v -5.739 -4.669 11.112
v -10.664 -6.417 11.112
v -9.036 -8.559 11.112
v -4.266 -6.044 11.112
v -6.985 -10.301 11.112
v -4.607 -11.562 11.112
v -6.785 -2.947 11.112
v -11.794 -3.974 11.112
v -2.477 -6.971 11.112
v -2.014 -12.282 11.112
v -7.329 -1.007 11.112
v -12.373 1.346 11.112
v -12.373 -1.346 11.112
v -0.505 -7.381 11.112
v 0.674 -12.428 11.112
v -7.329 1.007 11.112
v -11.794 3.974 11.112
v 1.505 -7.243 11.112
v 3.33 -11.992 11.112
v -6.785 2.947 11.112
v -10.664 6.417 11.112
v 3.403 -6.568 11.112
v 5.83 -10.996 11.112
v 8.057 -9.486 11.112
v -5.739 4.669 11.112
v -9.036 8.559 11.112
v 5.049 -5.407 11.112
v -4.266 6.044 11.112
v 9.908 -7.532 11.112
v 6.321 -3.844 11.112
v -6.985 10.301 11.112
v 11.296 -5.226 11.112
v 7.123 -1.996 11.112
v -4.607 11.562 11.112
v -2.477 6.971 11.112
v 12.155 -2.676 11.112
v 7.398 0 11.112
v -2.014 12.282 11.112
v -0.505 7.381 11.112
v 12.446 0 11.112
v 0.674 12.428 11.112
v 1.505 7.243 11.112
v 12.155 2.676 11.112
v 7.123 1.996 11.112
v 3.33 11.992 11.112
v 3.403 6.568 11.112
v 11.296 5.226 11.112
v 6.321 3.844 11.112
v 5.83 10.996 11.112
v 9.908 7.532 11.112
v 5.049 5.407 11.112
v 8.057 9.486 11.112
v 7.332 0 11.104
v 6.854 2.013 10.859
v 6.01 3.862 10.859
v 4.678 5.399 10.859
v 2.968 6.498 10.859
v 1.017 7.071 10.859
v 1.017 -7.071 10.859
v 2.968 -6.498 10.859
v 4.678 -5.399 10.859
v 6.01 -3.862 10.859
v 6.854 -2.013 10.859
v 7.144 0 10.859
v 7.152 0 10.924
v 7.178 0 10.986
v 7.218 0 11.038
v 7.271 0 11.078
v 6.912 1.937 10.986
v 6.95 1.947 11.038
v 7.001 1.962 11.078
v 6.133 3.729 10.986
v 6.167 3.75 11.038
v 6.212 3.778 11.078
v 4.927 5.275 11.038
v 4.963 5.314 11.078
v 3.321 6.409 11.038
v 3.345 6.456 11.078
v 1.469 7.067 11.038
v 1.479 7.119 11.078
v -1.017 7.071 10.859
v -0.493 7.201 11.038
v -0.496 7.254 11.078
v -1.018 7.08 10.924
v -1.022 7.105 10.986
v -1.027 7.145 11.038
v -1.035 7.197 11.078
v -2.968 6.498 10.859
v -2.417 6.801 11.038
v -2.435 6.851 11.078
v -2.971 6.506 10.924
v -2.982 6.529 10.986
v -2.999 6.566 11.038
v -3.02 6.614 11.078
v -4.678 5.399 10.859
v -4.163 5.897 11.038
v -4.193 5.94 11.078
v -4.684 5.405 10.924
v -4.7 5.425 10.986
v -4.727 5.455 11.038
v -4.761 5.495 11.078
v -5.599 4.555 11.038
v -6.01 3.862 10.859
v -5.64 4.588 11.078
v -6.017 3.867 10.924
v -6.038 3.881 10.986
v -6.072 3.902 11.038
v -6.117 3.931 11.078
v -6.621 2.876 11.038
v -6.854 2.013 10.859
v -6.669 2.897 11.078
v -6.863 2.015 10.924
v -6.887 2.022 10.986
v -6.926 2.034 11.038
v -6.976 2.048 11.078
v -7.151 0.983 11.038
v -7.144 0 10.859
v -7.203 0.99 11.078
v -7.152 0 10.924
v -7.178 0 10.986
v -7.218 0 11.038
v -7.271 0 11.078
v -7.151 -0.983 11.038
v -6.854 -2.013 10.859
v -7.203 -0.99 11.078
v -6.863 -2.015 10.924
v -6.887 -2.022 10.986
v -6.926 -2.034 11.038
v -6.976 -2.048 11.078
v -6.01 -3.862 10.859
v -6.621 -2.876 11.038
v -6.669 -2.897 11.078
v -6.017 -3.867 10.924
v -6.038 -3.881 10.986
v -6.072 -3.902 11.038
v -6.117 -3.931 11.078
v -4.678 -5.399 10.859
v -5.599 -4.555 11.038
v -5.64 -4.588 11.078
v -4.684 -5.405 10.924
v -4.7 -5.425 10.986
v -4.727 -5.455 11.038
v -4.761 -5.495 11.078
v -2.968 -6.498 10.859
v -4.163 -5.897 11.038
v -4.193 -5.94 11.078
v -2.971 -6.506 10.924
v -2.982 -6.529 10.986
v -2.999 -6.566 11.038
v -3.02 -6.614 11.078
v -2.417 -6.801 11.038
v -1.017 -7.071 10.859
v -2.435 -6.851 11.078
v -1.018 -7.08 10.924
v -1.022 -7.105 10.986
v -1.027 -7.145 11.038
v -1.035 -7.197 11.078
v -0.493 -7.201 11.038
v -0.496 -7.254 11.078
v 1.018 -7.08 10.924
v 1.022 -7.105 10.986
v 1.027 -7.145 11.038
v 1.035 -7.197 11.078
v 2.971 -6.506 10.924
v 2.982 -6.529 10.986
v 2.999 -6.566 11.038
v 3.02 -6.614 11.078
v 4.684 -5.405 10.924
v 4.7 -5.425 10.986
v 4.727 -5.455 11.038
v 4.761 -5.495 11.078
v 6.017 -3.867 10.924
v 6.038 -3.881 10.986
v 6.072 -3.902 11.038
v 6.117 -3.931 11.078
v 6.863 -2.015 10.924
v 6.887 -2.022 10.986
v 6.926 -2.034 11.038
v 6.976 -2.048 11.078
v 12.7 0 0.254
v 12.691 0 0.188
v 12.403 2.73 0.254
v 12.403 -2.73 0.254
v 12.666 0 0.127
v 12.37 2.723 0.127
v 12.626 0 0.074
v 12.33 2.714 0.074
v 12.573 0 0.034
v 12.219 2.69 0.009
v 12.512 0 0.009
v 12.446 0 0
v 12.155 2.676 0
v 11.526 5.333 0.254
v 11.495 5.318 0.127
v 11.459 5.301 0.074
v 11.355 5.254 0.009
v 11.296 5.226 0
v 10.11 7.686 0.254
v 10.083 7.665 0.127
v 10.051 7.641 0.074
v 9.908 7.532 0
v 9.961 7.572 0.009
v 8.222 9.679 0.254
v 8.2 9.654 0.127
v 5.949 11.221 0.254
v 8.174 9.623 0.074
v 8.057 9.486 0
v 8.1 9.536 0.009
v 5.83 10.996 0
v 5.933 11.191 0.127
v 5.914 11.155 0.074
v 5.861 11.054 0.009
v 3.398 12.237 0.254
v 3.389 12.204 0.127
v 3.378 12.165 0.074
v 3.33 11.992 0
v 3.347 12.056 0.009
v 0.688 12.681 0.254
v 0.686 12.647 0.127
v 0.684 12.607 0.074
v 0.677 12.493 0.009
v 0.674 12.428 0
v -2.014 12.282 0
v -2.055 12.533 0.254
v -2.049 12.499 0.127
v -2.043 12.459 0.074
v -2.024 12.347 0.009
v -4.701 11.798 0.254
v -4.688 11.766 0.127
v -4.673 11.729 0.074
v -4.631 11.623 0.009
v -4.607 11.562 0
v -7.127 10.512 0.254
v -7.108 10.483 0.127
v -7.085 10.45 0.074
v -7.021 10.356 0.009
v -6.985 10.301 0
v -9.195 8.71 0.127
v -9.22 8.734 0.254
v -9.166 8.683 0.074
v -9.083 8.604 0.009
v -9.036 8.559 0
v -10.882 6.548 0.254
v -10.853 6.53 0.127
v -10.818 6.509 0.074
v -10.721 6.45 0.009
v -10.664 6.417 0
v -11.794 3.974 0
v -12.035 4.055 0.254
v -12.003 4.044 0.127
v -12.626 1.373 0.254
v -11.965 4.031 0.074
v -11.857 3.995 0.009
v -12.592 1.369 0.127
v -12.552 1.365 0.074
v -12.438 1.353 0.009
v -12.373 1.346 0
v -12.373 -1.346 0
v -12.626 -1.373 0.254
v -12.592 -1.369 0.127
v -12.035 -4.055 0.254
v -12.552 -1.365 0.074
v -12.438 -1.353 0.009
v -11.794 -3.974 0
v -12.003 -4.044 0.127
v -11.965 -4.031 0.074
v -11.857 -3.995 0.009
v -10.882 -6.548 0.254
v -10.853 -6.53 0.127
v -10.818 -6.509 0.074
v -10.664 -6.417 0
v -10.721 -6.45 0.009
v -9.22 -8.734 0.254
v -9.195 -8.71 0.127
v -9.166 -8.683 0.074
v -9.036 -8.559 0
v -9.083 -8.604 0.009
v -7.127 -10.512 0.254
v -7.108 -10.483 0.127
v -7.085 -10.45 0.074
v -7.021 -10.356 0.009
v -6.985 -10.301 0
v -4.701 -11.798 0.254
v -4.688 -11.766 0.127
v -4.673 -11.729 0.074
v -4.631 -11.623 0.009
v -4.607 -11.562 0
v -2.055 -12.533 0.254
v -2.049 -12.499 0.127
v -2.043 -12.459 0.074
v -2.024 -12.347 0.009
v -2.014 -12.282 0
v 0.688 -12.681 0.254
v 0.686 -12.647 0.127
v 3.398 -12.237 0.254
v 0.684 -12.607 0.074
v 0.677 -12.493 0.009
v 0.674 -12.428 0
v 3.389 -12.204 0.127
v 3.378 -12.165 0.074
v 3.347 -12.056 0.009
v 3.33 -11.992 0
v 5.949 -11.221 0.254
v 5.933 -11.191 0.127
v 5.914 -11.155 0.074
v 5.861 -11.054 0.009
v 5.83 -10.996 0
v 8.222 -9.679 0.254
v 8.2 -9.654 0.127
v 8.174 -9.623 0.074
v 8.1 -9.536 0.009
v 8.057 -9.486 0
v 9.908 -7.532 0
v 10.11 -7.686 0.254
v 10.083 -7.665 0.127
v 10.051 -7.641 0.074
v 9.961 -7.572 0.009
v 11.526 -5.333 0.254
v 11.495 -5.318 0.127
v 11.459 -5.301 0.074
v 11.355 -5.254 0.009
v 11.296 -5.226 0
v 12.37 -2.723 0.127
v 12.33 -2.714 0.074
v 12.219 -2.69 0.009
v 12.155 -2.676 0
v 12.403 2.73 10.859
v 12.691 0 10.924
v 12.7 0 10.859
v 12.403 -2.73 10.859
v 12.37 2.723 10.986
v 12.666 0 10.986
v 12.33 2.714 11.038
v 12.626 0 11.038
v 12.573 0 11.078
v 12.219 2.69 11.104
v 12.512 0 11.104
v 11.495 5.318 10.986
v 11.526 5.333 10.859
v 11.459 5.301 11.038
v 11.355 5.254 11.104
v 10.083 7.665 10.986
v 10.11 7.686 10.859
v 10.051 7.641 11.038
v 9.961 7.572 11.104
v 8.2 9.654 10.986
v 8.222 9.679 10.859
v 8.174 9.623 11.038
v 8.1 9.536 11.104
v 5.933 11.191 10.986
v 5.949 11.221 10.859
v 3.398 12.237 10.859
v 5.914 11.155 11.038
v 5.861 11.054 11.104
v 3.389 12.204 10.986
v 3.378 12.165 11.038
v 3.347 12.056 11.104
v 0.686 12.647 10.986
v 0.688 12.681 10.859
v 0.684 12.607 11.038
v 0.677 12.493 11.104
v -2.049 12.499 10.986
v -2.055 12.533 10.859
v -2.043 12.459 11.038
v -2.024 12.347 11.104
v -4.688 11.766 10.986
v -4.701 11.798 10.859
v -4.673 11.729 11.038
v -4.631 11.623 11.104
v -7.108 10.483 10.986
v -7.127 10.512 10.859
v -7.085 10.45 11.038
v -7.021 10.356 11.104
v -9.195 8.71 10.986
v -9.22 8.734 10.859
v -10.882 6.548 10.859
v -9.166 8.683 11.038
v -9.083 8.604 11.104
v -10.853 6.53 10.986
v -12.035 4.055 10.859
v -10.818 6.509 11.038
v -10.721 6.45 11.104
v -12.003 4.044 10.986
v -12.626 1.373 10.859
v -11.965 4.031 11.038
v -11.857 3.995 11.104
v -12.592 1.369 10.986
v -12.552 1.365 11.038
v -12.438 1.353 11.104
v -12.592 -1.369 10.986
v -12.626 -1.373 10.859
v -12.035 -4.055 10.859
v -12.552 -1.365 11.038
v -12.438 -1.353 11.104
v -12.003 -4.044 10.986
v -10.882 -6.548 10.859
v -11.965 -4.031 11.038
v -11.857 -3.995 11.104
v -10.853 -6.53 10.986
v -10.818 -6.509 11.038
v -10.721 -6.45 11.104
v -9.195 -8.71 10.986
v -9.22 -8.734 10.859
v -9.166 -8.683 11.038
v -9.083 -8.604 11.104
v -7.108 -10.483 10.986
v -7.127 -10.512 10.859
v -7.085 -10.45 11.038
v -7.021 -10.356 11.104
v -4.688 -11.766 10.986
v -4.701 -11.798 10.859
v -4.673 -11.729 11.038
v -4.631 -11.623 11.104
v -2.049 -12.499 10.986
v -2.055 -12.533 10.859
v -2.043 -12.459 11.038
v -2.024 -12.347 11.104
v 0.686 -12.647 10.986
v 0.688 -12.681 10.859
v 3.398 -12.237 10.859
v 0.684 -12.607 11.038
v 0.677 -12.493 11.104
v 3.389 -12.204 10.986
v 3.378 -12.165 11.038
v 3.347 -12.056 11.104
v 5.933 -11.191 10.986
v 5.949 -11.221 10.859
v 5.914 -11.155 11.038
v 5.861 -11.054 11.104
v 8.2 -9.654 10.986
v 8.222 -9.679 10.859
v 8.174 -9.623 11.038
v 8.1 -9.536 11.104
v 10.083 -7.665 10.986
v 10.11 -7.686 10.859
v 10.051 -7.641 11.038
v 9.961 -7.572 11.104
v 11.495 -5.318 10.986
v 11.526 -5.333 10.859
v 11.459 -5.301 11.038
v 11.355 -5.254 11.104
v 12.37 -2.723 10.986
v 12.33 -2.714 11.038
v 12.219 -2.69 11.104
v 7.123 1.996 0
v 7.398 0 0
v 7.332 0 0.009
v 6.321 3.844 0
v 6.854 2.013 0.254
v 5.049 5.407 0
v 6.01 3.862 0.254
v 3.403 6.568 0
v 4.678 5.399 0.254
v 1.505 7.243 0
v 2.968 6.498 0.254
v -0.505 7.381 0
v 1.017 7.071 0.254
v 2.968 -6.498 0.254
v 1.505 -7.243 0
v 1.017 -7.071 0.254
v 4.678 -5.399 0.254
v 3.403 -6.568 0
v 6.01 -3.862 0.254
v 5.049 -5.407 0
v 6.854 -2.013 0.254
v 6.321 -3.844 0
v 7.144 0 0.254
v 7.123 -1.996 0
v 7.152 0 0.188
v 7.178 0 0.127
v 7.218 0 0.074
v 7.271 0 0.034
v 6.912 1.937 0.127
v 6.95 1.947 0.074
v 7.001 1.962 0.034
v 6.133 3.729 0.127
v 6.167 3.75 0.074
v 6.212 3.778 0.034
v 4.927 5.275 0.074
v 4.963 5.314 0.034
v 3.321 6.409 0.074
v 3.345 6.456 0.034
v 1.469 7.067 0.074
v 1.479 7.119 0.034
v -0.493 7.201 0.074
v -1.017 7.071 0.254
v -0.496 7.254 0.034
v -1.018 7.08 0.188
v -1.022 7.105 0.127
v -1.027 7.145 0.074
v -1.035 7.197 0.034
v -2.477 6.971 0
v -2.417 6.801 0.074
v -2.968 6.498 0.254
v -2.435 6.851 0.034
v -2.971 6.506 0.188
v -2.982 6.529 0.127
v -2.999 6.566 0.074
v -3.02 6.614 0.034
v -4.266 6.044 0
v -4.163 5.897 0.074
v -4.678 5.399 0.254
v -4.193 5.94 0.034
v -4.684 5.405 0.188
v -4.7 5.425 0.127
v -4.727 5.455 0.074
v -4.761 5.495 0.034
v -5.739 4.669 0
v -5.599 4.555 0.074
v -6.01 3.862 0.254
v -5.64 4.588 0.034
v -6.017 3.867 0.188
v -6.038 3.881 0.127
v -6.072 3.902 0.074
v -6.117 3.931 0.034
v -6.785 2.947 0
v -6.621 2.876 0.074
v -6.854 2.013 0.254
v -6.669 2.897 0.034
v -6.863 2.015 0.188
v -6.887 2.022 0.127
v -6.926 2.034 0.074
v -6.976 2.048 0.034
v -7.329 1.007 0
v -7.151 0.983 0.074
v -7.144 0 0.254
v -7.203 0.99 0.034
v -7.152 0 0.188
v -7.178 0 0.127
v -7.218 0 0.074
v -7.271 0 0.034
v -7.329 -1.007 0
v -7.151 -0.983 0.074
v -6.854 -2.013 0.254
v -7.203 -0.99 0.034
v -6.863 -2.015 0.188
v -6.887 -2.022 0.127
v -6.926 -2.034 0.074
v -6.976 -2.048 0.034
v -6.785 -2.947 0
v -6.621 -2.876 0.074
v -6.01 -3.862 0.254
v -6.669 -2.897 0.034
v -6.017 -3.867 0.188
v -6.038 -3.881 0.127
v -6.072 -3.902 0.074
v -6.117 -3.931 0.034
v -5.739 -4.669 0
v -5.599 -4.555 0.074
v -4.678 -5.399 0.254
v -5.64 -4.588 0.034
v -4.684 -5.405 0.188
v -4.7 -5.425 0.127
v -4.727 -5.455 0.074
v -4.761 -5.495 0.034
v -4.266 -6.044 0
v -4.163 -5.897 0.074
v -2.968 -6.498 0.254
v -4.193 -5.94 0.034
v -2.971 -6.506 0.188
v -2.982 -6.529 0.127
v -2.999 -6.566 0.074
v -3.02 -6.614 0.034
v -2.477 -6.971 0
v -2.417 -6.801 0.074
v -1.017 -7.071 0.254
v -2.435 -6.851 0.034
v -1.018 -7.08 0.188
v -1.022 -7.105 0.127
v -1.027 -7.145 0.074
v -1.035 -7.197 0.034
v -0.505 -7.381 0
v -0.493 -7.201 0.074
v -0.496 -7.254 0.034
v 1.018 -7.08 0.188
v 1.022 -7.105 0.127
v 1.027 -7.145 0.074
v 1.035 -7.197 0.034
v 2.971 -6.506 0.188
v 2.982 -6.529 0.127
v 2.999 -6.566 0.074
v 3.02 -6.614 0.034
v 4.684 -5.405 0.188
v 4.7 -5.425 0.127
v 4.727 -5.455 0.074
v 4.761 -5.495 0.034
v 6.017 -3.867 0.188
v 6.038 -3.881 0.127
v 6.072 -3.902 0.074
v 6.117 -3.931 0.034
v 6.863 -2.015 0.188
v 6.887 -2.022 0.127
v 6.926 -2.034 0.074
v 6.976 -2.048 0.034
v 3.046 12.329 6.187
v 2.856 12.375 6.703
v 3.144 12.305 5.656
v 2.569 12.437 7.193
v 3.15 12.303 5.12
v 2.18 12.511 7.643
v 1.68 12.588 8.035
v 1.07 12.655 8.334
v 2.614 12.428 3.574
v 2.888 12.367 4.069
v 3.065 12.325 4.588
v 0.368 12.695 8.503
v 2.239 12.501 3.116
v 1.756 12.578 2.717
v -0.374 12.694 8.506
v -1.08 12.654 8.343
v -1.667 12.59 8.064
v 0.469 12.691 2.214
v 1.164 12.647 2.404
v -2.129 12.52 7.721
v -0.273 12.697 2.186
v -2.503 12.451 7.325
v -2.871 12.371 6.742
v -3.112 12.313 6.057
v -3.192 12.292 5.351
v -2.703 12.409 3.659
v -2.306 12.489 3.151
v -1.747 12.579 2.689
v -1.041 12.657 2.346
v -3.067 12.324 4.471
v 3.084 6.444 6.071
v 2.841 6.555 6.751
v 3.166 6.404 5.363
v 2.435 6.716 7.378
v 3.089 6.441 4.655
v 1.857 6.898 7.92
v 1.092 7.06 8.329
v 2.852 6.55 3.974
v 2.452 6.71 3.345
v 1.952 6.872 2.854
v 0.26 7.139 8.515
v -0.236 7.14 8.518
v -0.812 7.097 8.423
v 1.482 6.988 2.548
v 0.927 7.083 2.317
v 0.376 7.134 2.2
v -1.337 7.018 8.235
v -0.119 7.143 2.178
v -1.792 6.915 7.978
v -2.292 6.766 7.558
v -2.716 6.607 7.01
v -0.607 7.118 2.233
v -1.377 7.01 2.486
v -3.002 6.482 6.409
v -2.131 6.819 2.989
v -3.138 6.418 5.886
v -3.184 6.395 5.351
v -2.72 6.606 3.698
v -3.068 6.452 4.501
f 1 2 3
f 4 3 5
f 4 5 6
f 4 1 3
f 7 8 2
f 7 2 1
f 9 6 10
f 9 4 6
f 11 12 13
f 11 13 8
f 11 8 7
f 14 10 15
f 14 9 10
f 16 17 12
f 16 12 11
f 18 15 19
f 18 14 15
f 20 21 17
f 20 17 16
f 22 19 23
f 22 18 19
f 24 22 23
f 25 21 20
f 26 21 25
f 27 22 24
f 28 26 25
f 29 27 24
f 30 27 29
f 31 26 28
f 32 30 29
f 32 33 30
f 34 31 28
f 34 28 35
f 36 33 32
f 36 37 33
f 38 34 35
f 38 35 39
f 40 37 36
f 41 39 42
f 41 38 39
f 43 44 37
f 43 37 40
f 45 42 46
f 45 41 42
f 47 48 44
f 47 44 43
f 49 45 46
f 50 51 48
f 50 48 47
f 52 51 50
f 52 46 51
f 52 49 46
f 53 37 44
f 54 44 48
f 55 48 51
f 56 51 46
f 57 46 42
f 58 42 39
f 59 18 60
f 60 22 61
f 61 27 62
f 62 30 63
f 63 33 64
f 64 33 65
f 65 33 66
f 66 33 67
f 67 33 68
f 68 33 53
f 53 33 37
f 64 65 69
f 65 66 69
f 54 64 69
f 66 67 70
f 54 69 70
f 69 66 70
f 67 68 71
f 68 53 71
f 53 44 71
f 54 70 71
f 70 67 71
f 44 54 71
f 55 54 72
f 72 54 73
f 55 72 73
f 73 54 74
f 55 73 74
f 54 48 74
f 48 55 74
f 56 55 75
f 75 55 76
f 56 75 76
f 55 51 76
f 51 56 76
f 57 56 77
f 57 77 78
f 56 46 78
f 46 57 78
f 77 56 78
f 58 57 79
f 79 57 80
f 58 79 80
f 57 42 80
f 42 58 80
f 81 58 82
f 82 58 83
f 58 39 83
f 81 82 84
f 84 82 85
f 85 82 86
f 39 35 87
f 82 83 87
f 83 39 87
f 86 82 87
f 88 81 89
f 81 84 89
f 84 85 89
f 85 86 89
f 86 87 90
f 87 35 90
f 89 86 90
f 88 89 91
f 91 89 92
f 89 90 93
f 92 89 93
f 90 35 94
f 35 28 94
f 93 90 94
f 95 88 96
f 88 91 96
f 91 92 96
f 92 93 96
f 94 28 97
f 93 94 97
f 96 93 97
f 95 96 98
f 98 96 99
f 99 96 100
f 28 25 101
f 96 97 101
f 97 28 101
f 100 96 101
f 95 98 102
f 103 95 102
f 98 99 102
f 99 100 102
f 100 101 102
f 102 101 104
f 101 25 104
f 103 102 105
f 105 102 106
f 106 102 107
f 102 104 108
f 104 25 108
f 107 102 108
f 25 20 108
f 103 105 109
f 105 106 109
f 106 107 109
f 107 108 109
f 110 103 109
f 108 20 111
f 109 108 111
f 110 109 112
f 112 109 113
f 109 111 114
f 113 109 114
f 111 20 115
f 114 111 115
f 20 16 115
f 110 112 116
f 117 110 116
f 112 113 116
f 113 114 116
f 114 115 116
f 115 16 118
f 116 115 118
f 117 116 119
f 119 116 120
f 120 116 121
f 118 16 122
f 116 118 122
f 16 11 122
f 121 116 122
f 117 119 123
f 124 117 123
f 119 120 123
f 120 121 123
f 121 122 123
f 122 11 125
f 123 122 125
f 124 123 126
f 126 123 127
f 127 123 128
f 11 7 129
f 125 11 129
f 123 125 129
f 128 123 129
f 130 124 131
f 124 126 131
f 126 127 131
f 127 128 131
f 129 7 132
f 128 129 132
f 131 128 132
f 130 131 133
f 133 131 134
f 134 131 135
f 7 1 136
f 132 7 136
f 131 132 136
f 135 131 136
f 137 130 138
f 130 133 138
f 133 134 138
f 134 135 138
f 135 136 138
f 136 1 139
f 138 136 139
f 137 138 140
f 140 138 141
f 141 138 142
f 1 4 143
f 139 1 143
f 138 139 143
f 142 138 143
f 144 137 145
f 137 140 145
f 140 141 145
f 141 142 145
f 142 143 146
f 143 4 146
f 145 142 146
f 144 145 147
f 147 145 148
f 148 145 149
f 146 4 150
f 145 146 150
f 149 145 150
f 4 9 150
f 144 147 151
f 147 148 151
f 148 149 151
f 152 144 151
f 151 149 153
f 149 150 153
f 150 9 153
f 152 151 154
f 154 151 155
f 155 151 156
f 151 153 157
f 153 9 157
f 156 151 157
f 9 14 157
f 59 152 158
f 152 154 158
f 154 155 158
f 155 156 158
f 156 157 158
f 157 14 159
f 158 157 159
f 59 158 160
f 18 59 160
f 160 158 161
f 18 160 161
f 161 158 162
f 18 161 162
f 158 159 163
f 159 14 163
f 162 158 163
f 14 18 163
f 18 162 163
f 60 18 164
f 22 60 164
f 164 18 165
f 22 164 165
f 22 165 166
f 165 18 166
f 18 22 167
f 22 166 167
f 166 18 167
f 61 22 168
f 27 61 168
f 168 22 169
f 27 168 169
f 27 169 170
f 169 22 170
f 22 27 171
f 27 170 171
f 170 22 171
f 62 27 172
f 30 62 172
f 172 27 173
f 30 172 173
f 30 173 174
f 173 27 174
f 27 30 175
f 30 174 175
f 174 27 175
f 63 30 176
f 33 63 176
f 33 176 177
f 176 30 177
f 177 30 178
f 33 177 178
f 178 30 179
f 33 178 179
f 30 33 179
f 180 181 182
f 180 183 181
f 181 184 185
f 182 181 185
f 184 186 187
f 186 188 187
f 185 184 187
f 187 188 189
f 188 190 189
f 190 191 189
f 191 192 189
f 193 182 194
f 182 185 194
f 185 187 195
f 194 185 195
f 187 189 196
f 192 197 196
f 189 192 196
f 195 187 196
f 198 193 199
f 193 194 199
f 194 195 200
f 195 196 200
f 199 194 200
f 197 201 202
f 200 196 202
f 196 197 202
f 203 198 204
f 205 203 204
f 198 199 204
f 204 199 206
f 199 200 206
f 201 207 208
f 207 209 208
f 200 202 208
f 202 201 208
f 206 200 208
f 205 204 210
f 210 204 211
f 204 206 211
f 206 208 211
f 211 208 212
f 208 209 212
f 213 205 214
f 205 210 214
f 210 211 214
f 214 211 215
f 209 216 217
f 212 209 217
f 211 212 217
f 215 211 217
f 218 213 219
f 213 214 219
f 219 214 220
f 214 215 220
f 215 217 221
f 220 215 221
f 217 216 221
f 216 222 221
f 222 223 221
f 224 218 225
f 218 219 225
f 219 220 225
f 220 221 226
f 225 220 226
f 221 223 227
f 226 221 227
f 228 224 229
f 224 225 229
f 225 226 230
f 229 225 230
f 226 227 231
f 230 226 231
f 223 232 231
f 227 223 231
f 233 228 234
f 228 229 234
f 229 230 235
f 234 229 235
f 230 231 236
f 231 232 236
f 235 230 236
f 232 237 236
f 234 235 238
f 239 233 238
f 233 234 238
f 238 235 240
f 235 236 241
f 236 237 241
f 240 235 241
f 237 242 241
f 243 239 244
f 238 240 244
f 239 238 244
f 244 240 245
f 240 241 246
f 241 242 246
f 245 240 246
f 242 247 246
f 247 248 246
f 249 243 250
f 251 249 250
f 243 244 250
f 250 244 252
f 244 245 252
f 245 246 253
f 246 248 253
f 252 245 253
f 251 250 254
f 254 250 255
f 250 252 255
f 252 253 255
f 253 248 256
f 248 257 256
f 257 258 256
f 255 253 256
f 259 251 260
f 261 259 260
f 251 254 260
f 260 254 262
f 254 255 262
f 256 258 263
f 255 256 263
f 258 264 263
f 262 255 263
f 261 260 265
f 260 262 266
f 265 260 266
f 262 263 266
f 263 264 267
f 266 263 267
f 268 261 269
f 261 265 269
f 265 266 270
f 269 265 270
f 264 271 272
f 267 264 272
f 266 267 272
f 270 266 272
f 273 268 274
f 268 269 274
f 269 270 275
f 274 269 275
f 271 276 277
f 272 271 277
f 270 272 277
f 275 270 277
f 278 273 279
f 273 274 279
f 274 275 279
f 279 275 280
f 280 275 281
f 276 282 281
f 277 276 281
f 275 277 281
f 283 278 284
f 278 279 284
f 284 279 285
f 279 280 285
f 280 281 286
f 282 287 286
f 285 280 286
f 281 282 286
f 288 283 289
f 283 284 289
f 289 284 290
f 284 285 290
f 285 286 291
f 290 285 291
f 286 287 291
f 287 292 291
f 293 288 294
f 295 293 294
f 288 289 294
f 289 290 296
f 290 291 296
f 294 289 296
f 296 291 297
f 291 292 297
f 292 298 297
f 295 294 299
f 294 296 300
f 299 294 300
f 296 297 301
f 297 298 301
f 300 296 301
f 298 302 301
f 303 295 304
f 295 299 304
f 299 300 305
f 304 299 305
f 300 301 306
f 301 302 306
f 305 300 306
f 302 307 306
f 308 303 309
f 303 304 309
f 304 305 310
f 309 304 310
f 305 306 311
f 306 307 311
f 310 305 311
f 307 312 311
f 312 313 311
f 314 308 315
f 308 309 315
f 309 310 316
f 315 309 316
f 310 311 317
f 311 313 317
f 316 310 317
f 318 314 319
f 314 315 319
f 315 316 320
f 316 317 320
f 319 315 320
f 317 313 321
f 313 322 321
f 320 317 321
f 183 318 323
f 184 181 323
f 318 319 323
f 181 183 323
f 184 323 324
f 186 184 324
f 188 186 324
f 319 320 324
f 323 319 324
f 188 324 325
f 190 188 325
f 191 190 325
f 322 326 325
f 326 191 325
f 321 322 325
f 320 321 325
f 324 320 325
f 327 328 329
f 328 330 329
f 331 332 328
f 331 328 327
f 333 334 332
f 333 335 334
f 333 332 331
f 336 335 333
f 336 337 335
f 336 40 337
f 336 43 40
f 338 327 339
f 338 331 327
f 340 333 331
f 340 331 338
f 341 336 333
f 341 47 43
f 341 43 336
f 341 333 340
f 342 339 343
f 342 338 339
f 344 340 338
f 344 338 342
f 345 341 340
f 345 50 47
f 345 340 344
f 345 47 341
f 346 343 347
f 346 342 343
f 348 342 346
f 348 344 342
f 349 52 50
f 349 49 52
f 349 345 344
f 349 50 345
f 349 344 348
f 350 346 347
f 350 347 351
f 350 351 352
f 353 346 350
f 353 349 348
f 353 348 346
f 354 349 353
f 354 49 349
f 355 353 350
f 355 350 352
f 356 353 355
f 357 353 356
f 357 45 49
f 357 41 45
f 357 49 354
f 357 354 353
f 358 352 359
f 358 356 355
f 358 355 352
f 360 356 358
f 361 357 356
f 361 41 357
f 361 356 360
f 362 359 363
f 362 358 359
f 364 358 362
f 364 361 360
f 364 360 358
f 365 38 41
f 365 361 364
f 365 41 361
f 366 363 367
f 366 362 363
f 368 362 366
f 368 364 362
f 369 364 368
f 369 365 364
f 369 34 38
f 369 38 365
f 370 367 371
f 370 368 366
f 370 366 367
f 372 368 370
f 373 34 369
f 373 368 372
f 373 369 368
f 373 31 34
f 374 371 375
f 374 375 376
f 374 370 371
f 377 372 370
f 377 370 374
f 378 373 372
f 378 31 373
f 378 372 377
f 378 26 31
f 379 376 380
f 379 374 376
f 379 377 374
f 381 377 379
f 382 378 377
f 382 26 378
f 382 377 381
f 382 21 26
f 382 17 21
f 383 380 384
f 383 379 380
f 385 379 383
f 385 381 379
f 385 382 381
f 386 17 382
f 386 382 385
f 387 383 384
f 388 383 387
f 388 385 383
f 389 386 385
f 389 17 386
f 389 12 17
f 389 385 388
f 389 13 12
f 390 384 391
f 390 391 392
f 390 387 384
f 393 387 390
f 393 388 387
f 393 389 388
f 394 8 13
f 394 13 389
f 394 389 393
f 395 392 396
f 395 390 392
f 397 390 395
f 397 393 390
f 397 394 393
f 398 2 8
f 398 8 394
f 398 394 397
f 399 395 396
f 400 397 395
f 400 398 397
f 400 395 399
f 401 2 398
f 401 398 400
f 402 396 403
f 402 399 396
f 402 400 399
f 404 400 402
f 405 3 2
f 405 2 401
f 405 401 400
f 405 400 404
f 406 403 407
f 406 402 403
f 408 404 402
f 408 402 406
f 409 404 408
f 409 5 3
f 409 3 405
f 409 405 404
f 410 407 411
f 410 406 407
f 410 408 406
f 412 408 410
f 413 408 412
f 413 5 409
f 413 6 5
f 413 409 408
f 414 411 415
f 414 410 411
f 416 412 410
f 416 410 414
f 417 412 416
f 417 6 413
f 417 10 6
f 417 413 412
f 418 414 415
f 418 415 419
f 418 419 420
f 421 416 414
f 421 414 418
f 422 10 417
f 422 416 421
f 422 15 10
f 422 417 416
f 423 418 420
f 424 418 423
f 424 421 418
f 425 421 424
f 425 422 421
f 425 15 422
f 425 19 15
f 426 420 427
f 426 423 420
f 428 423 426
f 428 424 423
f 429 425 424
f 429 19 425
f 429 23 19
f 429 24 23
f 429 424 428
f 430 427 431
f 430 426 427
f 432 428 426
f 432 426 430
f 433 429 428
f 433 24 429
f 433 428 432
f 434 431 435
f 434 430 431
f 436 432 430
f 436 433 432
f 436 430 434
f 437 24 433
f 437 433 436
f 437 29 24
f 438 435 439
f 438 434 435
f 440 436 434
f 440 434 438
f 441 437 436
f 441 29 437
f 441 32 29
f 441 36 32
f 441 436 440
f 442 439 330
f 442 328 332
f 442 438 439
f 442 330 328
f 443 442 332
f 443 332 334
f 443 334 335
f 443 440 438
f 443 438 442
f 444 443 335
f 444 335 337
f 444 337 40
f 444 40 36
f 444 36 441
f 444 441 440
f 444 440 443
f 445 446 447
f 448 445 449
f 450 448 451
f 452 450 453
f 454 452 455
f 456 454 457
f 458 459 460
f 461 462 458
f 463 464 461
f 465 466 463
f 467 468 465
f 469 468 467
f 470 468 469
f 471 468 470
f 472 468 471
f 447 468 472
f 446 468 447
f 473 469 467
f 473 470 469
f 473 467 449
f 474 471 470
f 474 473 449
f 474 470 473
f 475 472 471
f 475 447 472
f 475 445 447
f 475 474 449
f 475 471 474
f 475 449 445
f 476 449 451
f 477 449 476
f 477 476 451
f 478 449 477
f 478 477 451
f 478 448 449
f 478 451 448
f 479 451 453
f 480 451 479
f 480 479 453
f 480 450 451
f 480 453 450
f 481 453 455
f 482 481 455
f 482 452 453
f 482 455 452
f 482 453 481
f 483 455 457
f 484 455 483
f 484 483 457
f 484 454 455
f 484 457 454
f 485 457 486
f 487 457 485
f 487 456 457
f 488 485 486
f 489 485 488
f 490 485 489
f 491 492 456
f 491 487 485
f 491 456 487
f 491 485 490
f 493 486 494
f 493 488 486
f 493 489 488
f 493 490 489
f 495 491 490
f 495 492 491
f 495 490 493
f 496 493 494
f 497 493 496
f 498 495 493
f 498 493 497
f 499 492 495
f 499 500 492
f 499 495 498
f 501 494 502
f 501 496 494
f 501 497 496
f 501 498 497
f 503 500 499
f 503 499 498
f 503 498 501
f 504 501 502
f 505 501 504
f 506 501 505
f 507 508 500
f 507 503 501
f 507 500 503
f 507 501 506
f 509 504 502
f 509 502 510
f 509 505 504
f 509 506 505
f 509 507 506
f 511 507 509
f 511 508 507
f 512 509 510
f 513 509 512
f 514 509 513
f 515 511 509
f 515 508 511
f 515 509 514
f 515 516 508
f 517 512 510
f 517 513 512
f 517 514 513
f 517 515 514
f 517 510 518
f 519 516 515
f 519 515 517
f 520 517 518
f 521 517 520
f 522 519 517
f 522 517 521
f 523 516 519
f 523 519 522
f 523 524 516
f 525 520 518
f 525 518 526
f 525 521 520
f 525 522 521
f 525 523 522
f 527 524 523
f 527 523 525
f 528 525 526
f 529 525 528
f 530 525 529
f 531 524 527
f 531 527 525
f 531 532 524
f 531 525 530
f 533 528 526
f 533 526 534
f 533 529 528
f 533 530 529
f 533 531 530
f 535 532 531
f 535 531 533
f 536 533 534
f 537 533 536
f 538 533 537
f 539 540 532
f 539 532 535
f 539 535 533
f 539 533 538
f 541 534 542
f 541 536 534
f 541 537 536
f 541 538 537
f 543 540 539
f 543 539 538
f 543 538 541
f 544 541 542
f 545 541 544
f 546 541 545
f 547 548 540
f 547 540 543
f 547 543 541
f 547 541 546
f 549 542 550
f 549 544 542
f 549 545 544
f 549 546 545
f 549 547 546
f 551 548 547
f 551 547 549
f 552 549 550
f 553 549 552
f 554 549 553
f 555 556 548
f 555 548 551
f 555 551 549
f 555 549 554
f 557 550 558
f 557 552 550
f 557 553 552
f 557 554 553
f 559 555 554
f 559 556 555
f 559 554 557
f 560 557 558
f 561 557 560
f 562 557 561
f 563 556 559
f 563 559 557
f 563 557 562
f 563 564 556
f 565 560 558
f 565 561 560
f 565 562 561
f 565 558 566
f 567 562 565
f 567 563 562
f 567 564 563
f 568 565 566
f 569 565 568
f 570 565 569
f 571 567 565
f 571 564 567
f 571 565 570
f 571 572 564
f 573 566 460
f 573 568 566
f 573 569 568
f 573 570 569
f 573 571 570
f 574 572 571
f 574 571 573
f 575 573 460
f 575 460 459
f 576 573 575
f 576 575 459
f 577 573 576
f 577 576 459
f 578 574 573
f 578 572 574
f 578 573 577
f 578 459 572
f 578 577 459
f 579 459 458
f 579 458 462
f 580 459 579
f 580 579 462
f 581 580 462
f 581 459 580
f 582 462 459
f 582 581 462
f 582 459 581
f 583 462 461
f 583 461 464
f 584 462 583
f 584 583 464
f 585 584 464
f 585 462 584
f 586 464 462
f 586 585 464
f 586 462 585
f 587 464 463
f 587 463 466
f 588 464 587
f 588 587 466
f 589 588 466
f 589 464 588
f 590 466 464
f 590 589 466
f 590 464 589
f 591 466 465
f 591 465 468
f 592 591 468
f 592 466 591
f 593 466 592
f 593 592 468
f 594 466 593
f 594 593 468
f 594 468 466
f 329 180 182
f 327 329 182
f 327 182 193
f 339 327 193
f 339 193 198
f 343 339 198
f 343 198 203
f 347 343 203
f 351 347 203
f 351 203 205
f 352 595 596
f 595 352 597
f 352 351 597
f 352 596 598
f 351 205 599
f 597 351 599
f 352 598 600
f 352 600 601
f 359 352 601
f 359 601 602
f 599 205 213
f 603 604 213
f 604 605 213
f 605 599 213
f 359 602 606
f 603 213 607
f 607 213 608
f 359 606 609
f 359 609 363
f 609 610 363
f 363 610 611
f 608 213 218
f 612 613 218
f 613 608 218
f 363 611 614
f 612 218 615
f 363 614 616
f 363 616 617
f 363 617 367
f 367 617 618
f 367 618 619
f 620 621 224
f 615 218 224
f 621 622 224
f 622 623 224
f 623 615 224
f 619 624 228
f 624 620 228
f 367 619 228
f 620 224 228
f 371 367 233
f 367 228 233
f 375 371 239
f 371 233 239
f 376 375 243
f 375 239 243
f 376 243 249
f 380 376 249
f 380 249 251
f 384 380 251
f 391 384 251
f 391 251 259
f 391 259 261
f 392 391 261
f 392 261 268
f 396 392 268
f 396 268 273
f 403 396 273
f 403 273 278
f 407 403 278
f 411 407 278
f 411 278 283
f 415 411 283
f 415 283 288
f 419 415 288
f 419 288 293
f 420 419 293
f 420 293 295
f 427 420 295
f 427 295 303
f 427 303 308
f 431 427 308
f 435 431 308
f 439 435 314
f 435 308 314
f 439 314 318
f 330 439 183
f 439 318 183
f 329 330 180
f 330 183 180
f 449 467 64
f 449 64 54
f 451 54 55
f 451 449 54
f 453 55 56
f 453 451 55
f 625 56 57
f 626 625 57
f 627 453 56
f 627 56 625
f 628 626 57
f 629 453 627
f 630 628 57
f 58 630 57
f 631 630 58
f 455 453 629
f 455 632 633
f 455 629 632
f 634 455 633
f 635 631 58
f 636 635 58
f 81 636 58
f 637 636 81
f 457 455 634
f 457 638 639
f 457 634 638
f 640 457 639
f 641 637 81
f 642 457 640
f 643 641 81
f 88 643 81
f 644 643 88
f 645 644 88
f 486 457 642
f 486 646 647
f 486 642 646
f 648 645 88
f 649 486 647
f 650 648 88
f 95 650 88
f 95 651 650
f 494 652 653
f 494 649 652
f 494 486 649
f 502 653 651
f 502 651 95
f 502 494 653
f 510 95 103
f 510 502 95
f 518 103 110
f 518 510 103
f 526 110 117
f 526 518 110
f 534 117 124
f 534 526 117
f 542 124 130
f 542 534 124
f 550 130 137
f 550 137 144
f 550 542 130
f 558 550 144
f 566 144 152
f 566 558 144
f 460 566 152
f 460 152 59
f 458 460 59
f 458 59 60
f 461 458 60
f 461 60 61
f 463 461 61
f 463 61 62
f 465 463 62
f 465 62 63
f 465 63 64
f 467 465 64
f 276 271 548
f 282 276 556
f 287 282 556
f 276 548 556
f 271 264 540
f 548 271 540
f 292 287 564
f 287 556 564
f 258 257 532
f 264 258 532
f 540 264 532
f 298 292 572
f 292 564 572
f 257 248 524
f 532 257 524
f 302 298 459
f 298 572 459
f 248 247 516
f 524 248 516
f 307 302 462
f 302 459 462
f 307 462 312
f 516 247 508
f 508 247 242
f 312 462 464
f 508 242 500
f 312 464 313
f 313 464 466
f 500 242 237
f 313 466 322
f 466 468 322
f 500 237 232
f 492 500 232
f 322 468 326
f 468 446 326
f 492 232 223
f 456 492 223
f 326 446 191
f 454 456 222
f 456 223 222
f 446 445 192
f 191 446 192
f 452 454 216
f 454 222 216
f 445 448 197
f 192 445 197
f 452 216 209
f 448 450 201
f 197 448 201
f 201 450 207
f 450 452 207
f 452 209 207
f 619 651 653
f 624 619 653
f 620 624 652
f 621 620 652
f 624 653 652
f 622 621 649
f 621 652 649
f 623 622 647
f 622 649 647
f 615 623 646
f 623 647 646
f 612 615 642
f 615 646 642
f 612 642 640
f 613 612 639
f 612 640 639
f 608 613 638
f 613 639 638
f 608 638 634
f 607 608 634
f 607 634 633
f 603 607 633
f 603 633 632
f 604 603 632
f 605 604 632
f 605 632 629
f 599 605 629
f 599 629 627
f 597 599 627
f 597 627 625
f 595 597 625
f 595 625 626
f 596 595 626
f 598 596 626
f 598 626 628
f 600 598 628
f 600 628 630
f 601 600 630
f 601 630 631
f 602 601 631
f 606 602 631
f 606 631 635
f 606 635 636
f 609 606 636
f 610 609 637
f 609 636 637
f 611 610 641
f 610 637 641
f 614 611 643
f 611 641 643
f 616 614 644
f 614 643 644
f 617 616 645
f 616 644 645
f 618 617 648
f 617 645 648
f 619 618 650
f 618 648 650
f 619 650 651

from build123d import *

# Parameters (mm, degrees)
SKETCH1_R                       = 12.7
SKETCH1_R_2                     = 7.14375
BOSS_EXTRUDE1_DEPTH             = 11.1125
FILLET1_R                       = 0.254
F_1_4_0_25_DIAMETER_HOLE1_D     = 6.35
F_1_4_0_25_DIAMETER_HOLE1_DEPTH = 10.922
F_1_4_0_25_DIAMETER_HOLE1_TIP   = 1.907732465


with BuildPart() as part:
    # Sketch1 → Boss-Extrude1 (new body)
    with BuildSketch(Plane.XY):
        Circle(SKETCH1_R)
        Circle(SKETCH1_R_2, mode=Mode.SUBTRACT)
    extrude(amount=BOSS_EXTRUDE1_DEPTH)

    # Fillet1
    fillet1_edges = [part.edges().sort_by_distance(p)[0] for p in [
        (-12.7, 0, 0),
        (-12.7, 0, 11.1125),
        (-7.14375, 0, 0),
        (-7.14375, 0, 11.1125),
    ]]
    fillet(fillet1_edges, radius=FILLET1_R)

    # 1/4 (0.25) Diameter Hole1
    with Locations(Plane(origin=(-0.017095138, 12.699988494, 5.351108343), x_dir=(0.999999094, 0.001346074, 0), z_dir=(-0.001346074, 0.999999094, 0))):
        with Locations((0, 0)):
            Hole(F_1_4_0_25_DIAMETER_HOLE1_D / 2, depth=F_1_4_0_25_DIAMETER_HOLE1_DEPTH)
            with Locations((0, 0, -(F_1_4_0_25_DIAMETER_HOLE1_DEPTH + F_1_4_0_25_DIAMETER_HOLE1_TIP / 2))):  # 118° drill point
                Cone(0, F_1_4_0_25_DIAMETER_HOLE1_D / 2, F_1_4_0_25_DIAMETER_HOLE1_TIP, mode=Mode.SUBTRACT)


solid = part.part
